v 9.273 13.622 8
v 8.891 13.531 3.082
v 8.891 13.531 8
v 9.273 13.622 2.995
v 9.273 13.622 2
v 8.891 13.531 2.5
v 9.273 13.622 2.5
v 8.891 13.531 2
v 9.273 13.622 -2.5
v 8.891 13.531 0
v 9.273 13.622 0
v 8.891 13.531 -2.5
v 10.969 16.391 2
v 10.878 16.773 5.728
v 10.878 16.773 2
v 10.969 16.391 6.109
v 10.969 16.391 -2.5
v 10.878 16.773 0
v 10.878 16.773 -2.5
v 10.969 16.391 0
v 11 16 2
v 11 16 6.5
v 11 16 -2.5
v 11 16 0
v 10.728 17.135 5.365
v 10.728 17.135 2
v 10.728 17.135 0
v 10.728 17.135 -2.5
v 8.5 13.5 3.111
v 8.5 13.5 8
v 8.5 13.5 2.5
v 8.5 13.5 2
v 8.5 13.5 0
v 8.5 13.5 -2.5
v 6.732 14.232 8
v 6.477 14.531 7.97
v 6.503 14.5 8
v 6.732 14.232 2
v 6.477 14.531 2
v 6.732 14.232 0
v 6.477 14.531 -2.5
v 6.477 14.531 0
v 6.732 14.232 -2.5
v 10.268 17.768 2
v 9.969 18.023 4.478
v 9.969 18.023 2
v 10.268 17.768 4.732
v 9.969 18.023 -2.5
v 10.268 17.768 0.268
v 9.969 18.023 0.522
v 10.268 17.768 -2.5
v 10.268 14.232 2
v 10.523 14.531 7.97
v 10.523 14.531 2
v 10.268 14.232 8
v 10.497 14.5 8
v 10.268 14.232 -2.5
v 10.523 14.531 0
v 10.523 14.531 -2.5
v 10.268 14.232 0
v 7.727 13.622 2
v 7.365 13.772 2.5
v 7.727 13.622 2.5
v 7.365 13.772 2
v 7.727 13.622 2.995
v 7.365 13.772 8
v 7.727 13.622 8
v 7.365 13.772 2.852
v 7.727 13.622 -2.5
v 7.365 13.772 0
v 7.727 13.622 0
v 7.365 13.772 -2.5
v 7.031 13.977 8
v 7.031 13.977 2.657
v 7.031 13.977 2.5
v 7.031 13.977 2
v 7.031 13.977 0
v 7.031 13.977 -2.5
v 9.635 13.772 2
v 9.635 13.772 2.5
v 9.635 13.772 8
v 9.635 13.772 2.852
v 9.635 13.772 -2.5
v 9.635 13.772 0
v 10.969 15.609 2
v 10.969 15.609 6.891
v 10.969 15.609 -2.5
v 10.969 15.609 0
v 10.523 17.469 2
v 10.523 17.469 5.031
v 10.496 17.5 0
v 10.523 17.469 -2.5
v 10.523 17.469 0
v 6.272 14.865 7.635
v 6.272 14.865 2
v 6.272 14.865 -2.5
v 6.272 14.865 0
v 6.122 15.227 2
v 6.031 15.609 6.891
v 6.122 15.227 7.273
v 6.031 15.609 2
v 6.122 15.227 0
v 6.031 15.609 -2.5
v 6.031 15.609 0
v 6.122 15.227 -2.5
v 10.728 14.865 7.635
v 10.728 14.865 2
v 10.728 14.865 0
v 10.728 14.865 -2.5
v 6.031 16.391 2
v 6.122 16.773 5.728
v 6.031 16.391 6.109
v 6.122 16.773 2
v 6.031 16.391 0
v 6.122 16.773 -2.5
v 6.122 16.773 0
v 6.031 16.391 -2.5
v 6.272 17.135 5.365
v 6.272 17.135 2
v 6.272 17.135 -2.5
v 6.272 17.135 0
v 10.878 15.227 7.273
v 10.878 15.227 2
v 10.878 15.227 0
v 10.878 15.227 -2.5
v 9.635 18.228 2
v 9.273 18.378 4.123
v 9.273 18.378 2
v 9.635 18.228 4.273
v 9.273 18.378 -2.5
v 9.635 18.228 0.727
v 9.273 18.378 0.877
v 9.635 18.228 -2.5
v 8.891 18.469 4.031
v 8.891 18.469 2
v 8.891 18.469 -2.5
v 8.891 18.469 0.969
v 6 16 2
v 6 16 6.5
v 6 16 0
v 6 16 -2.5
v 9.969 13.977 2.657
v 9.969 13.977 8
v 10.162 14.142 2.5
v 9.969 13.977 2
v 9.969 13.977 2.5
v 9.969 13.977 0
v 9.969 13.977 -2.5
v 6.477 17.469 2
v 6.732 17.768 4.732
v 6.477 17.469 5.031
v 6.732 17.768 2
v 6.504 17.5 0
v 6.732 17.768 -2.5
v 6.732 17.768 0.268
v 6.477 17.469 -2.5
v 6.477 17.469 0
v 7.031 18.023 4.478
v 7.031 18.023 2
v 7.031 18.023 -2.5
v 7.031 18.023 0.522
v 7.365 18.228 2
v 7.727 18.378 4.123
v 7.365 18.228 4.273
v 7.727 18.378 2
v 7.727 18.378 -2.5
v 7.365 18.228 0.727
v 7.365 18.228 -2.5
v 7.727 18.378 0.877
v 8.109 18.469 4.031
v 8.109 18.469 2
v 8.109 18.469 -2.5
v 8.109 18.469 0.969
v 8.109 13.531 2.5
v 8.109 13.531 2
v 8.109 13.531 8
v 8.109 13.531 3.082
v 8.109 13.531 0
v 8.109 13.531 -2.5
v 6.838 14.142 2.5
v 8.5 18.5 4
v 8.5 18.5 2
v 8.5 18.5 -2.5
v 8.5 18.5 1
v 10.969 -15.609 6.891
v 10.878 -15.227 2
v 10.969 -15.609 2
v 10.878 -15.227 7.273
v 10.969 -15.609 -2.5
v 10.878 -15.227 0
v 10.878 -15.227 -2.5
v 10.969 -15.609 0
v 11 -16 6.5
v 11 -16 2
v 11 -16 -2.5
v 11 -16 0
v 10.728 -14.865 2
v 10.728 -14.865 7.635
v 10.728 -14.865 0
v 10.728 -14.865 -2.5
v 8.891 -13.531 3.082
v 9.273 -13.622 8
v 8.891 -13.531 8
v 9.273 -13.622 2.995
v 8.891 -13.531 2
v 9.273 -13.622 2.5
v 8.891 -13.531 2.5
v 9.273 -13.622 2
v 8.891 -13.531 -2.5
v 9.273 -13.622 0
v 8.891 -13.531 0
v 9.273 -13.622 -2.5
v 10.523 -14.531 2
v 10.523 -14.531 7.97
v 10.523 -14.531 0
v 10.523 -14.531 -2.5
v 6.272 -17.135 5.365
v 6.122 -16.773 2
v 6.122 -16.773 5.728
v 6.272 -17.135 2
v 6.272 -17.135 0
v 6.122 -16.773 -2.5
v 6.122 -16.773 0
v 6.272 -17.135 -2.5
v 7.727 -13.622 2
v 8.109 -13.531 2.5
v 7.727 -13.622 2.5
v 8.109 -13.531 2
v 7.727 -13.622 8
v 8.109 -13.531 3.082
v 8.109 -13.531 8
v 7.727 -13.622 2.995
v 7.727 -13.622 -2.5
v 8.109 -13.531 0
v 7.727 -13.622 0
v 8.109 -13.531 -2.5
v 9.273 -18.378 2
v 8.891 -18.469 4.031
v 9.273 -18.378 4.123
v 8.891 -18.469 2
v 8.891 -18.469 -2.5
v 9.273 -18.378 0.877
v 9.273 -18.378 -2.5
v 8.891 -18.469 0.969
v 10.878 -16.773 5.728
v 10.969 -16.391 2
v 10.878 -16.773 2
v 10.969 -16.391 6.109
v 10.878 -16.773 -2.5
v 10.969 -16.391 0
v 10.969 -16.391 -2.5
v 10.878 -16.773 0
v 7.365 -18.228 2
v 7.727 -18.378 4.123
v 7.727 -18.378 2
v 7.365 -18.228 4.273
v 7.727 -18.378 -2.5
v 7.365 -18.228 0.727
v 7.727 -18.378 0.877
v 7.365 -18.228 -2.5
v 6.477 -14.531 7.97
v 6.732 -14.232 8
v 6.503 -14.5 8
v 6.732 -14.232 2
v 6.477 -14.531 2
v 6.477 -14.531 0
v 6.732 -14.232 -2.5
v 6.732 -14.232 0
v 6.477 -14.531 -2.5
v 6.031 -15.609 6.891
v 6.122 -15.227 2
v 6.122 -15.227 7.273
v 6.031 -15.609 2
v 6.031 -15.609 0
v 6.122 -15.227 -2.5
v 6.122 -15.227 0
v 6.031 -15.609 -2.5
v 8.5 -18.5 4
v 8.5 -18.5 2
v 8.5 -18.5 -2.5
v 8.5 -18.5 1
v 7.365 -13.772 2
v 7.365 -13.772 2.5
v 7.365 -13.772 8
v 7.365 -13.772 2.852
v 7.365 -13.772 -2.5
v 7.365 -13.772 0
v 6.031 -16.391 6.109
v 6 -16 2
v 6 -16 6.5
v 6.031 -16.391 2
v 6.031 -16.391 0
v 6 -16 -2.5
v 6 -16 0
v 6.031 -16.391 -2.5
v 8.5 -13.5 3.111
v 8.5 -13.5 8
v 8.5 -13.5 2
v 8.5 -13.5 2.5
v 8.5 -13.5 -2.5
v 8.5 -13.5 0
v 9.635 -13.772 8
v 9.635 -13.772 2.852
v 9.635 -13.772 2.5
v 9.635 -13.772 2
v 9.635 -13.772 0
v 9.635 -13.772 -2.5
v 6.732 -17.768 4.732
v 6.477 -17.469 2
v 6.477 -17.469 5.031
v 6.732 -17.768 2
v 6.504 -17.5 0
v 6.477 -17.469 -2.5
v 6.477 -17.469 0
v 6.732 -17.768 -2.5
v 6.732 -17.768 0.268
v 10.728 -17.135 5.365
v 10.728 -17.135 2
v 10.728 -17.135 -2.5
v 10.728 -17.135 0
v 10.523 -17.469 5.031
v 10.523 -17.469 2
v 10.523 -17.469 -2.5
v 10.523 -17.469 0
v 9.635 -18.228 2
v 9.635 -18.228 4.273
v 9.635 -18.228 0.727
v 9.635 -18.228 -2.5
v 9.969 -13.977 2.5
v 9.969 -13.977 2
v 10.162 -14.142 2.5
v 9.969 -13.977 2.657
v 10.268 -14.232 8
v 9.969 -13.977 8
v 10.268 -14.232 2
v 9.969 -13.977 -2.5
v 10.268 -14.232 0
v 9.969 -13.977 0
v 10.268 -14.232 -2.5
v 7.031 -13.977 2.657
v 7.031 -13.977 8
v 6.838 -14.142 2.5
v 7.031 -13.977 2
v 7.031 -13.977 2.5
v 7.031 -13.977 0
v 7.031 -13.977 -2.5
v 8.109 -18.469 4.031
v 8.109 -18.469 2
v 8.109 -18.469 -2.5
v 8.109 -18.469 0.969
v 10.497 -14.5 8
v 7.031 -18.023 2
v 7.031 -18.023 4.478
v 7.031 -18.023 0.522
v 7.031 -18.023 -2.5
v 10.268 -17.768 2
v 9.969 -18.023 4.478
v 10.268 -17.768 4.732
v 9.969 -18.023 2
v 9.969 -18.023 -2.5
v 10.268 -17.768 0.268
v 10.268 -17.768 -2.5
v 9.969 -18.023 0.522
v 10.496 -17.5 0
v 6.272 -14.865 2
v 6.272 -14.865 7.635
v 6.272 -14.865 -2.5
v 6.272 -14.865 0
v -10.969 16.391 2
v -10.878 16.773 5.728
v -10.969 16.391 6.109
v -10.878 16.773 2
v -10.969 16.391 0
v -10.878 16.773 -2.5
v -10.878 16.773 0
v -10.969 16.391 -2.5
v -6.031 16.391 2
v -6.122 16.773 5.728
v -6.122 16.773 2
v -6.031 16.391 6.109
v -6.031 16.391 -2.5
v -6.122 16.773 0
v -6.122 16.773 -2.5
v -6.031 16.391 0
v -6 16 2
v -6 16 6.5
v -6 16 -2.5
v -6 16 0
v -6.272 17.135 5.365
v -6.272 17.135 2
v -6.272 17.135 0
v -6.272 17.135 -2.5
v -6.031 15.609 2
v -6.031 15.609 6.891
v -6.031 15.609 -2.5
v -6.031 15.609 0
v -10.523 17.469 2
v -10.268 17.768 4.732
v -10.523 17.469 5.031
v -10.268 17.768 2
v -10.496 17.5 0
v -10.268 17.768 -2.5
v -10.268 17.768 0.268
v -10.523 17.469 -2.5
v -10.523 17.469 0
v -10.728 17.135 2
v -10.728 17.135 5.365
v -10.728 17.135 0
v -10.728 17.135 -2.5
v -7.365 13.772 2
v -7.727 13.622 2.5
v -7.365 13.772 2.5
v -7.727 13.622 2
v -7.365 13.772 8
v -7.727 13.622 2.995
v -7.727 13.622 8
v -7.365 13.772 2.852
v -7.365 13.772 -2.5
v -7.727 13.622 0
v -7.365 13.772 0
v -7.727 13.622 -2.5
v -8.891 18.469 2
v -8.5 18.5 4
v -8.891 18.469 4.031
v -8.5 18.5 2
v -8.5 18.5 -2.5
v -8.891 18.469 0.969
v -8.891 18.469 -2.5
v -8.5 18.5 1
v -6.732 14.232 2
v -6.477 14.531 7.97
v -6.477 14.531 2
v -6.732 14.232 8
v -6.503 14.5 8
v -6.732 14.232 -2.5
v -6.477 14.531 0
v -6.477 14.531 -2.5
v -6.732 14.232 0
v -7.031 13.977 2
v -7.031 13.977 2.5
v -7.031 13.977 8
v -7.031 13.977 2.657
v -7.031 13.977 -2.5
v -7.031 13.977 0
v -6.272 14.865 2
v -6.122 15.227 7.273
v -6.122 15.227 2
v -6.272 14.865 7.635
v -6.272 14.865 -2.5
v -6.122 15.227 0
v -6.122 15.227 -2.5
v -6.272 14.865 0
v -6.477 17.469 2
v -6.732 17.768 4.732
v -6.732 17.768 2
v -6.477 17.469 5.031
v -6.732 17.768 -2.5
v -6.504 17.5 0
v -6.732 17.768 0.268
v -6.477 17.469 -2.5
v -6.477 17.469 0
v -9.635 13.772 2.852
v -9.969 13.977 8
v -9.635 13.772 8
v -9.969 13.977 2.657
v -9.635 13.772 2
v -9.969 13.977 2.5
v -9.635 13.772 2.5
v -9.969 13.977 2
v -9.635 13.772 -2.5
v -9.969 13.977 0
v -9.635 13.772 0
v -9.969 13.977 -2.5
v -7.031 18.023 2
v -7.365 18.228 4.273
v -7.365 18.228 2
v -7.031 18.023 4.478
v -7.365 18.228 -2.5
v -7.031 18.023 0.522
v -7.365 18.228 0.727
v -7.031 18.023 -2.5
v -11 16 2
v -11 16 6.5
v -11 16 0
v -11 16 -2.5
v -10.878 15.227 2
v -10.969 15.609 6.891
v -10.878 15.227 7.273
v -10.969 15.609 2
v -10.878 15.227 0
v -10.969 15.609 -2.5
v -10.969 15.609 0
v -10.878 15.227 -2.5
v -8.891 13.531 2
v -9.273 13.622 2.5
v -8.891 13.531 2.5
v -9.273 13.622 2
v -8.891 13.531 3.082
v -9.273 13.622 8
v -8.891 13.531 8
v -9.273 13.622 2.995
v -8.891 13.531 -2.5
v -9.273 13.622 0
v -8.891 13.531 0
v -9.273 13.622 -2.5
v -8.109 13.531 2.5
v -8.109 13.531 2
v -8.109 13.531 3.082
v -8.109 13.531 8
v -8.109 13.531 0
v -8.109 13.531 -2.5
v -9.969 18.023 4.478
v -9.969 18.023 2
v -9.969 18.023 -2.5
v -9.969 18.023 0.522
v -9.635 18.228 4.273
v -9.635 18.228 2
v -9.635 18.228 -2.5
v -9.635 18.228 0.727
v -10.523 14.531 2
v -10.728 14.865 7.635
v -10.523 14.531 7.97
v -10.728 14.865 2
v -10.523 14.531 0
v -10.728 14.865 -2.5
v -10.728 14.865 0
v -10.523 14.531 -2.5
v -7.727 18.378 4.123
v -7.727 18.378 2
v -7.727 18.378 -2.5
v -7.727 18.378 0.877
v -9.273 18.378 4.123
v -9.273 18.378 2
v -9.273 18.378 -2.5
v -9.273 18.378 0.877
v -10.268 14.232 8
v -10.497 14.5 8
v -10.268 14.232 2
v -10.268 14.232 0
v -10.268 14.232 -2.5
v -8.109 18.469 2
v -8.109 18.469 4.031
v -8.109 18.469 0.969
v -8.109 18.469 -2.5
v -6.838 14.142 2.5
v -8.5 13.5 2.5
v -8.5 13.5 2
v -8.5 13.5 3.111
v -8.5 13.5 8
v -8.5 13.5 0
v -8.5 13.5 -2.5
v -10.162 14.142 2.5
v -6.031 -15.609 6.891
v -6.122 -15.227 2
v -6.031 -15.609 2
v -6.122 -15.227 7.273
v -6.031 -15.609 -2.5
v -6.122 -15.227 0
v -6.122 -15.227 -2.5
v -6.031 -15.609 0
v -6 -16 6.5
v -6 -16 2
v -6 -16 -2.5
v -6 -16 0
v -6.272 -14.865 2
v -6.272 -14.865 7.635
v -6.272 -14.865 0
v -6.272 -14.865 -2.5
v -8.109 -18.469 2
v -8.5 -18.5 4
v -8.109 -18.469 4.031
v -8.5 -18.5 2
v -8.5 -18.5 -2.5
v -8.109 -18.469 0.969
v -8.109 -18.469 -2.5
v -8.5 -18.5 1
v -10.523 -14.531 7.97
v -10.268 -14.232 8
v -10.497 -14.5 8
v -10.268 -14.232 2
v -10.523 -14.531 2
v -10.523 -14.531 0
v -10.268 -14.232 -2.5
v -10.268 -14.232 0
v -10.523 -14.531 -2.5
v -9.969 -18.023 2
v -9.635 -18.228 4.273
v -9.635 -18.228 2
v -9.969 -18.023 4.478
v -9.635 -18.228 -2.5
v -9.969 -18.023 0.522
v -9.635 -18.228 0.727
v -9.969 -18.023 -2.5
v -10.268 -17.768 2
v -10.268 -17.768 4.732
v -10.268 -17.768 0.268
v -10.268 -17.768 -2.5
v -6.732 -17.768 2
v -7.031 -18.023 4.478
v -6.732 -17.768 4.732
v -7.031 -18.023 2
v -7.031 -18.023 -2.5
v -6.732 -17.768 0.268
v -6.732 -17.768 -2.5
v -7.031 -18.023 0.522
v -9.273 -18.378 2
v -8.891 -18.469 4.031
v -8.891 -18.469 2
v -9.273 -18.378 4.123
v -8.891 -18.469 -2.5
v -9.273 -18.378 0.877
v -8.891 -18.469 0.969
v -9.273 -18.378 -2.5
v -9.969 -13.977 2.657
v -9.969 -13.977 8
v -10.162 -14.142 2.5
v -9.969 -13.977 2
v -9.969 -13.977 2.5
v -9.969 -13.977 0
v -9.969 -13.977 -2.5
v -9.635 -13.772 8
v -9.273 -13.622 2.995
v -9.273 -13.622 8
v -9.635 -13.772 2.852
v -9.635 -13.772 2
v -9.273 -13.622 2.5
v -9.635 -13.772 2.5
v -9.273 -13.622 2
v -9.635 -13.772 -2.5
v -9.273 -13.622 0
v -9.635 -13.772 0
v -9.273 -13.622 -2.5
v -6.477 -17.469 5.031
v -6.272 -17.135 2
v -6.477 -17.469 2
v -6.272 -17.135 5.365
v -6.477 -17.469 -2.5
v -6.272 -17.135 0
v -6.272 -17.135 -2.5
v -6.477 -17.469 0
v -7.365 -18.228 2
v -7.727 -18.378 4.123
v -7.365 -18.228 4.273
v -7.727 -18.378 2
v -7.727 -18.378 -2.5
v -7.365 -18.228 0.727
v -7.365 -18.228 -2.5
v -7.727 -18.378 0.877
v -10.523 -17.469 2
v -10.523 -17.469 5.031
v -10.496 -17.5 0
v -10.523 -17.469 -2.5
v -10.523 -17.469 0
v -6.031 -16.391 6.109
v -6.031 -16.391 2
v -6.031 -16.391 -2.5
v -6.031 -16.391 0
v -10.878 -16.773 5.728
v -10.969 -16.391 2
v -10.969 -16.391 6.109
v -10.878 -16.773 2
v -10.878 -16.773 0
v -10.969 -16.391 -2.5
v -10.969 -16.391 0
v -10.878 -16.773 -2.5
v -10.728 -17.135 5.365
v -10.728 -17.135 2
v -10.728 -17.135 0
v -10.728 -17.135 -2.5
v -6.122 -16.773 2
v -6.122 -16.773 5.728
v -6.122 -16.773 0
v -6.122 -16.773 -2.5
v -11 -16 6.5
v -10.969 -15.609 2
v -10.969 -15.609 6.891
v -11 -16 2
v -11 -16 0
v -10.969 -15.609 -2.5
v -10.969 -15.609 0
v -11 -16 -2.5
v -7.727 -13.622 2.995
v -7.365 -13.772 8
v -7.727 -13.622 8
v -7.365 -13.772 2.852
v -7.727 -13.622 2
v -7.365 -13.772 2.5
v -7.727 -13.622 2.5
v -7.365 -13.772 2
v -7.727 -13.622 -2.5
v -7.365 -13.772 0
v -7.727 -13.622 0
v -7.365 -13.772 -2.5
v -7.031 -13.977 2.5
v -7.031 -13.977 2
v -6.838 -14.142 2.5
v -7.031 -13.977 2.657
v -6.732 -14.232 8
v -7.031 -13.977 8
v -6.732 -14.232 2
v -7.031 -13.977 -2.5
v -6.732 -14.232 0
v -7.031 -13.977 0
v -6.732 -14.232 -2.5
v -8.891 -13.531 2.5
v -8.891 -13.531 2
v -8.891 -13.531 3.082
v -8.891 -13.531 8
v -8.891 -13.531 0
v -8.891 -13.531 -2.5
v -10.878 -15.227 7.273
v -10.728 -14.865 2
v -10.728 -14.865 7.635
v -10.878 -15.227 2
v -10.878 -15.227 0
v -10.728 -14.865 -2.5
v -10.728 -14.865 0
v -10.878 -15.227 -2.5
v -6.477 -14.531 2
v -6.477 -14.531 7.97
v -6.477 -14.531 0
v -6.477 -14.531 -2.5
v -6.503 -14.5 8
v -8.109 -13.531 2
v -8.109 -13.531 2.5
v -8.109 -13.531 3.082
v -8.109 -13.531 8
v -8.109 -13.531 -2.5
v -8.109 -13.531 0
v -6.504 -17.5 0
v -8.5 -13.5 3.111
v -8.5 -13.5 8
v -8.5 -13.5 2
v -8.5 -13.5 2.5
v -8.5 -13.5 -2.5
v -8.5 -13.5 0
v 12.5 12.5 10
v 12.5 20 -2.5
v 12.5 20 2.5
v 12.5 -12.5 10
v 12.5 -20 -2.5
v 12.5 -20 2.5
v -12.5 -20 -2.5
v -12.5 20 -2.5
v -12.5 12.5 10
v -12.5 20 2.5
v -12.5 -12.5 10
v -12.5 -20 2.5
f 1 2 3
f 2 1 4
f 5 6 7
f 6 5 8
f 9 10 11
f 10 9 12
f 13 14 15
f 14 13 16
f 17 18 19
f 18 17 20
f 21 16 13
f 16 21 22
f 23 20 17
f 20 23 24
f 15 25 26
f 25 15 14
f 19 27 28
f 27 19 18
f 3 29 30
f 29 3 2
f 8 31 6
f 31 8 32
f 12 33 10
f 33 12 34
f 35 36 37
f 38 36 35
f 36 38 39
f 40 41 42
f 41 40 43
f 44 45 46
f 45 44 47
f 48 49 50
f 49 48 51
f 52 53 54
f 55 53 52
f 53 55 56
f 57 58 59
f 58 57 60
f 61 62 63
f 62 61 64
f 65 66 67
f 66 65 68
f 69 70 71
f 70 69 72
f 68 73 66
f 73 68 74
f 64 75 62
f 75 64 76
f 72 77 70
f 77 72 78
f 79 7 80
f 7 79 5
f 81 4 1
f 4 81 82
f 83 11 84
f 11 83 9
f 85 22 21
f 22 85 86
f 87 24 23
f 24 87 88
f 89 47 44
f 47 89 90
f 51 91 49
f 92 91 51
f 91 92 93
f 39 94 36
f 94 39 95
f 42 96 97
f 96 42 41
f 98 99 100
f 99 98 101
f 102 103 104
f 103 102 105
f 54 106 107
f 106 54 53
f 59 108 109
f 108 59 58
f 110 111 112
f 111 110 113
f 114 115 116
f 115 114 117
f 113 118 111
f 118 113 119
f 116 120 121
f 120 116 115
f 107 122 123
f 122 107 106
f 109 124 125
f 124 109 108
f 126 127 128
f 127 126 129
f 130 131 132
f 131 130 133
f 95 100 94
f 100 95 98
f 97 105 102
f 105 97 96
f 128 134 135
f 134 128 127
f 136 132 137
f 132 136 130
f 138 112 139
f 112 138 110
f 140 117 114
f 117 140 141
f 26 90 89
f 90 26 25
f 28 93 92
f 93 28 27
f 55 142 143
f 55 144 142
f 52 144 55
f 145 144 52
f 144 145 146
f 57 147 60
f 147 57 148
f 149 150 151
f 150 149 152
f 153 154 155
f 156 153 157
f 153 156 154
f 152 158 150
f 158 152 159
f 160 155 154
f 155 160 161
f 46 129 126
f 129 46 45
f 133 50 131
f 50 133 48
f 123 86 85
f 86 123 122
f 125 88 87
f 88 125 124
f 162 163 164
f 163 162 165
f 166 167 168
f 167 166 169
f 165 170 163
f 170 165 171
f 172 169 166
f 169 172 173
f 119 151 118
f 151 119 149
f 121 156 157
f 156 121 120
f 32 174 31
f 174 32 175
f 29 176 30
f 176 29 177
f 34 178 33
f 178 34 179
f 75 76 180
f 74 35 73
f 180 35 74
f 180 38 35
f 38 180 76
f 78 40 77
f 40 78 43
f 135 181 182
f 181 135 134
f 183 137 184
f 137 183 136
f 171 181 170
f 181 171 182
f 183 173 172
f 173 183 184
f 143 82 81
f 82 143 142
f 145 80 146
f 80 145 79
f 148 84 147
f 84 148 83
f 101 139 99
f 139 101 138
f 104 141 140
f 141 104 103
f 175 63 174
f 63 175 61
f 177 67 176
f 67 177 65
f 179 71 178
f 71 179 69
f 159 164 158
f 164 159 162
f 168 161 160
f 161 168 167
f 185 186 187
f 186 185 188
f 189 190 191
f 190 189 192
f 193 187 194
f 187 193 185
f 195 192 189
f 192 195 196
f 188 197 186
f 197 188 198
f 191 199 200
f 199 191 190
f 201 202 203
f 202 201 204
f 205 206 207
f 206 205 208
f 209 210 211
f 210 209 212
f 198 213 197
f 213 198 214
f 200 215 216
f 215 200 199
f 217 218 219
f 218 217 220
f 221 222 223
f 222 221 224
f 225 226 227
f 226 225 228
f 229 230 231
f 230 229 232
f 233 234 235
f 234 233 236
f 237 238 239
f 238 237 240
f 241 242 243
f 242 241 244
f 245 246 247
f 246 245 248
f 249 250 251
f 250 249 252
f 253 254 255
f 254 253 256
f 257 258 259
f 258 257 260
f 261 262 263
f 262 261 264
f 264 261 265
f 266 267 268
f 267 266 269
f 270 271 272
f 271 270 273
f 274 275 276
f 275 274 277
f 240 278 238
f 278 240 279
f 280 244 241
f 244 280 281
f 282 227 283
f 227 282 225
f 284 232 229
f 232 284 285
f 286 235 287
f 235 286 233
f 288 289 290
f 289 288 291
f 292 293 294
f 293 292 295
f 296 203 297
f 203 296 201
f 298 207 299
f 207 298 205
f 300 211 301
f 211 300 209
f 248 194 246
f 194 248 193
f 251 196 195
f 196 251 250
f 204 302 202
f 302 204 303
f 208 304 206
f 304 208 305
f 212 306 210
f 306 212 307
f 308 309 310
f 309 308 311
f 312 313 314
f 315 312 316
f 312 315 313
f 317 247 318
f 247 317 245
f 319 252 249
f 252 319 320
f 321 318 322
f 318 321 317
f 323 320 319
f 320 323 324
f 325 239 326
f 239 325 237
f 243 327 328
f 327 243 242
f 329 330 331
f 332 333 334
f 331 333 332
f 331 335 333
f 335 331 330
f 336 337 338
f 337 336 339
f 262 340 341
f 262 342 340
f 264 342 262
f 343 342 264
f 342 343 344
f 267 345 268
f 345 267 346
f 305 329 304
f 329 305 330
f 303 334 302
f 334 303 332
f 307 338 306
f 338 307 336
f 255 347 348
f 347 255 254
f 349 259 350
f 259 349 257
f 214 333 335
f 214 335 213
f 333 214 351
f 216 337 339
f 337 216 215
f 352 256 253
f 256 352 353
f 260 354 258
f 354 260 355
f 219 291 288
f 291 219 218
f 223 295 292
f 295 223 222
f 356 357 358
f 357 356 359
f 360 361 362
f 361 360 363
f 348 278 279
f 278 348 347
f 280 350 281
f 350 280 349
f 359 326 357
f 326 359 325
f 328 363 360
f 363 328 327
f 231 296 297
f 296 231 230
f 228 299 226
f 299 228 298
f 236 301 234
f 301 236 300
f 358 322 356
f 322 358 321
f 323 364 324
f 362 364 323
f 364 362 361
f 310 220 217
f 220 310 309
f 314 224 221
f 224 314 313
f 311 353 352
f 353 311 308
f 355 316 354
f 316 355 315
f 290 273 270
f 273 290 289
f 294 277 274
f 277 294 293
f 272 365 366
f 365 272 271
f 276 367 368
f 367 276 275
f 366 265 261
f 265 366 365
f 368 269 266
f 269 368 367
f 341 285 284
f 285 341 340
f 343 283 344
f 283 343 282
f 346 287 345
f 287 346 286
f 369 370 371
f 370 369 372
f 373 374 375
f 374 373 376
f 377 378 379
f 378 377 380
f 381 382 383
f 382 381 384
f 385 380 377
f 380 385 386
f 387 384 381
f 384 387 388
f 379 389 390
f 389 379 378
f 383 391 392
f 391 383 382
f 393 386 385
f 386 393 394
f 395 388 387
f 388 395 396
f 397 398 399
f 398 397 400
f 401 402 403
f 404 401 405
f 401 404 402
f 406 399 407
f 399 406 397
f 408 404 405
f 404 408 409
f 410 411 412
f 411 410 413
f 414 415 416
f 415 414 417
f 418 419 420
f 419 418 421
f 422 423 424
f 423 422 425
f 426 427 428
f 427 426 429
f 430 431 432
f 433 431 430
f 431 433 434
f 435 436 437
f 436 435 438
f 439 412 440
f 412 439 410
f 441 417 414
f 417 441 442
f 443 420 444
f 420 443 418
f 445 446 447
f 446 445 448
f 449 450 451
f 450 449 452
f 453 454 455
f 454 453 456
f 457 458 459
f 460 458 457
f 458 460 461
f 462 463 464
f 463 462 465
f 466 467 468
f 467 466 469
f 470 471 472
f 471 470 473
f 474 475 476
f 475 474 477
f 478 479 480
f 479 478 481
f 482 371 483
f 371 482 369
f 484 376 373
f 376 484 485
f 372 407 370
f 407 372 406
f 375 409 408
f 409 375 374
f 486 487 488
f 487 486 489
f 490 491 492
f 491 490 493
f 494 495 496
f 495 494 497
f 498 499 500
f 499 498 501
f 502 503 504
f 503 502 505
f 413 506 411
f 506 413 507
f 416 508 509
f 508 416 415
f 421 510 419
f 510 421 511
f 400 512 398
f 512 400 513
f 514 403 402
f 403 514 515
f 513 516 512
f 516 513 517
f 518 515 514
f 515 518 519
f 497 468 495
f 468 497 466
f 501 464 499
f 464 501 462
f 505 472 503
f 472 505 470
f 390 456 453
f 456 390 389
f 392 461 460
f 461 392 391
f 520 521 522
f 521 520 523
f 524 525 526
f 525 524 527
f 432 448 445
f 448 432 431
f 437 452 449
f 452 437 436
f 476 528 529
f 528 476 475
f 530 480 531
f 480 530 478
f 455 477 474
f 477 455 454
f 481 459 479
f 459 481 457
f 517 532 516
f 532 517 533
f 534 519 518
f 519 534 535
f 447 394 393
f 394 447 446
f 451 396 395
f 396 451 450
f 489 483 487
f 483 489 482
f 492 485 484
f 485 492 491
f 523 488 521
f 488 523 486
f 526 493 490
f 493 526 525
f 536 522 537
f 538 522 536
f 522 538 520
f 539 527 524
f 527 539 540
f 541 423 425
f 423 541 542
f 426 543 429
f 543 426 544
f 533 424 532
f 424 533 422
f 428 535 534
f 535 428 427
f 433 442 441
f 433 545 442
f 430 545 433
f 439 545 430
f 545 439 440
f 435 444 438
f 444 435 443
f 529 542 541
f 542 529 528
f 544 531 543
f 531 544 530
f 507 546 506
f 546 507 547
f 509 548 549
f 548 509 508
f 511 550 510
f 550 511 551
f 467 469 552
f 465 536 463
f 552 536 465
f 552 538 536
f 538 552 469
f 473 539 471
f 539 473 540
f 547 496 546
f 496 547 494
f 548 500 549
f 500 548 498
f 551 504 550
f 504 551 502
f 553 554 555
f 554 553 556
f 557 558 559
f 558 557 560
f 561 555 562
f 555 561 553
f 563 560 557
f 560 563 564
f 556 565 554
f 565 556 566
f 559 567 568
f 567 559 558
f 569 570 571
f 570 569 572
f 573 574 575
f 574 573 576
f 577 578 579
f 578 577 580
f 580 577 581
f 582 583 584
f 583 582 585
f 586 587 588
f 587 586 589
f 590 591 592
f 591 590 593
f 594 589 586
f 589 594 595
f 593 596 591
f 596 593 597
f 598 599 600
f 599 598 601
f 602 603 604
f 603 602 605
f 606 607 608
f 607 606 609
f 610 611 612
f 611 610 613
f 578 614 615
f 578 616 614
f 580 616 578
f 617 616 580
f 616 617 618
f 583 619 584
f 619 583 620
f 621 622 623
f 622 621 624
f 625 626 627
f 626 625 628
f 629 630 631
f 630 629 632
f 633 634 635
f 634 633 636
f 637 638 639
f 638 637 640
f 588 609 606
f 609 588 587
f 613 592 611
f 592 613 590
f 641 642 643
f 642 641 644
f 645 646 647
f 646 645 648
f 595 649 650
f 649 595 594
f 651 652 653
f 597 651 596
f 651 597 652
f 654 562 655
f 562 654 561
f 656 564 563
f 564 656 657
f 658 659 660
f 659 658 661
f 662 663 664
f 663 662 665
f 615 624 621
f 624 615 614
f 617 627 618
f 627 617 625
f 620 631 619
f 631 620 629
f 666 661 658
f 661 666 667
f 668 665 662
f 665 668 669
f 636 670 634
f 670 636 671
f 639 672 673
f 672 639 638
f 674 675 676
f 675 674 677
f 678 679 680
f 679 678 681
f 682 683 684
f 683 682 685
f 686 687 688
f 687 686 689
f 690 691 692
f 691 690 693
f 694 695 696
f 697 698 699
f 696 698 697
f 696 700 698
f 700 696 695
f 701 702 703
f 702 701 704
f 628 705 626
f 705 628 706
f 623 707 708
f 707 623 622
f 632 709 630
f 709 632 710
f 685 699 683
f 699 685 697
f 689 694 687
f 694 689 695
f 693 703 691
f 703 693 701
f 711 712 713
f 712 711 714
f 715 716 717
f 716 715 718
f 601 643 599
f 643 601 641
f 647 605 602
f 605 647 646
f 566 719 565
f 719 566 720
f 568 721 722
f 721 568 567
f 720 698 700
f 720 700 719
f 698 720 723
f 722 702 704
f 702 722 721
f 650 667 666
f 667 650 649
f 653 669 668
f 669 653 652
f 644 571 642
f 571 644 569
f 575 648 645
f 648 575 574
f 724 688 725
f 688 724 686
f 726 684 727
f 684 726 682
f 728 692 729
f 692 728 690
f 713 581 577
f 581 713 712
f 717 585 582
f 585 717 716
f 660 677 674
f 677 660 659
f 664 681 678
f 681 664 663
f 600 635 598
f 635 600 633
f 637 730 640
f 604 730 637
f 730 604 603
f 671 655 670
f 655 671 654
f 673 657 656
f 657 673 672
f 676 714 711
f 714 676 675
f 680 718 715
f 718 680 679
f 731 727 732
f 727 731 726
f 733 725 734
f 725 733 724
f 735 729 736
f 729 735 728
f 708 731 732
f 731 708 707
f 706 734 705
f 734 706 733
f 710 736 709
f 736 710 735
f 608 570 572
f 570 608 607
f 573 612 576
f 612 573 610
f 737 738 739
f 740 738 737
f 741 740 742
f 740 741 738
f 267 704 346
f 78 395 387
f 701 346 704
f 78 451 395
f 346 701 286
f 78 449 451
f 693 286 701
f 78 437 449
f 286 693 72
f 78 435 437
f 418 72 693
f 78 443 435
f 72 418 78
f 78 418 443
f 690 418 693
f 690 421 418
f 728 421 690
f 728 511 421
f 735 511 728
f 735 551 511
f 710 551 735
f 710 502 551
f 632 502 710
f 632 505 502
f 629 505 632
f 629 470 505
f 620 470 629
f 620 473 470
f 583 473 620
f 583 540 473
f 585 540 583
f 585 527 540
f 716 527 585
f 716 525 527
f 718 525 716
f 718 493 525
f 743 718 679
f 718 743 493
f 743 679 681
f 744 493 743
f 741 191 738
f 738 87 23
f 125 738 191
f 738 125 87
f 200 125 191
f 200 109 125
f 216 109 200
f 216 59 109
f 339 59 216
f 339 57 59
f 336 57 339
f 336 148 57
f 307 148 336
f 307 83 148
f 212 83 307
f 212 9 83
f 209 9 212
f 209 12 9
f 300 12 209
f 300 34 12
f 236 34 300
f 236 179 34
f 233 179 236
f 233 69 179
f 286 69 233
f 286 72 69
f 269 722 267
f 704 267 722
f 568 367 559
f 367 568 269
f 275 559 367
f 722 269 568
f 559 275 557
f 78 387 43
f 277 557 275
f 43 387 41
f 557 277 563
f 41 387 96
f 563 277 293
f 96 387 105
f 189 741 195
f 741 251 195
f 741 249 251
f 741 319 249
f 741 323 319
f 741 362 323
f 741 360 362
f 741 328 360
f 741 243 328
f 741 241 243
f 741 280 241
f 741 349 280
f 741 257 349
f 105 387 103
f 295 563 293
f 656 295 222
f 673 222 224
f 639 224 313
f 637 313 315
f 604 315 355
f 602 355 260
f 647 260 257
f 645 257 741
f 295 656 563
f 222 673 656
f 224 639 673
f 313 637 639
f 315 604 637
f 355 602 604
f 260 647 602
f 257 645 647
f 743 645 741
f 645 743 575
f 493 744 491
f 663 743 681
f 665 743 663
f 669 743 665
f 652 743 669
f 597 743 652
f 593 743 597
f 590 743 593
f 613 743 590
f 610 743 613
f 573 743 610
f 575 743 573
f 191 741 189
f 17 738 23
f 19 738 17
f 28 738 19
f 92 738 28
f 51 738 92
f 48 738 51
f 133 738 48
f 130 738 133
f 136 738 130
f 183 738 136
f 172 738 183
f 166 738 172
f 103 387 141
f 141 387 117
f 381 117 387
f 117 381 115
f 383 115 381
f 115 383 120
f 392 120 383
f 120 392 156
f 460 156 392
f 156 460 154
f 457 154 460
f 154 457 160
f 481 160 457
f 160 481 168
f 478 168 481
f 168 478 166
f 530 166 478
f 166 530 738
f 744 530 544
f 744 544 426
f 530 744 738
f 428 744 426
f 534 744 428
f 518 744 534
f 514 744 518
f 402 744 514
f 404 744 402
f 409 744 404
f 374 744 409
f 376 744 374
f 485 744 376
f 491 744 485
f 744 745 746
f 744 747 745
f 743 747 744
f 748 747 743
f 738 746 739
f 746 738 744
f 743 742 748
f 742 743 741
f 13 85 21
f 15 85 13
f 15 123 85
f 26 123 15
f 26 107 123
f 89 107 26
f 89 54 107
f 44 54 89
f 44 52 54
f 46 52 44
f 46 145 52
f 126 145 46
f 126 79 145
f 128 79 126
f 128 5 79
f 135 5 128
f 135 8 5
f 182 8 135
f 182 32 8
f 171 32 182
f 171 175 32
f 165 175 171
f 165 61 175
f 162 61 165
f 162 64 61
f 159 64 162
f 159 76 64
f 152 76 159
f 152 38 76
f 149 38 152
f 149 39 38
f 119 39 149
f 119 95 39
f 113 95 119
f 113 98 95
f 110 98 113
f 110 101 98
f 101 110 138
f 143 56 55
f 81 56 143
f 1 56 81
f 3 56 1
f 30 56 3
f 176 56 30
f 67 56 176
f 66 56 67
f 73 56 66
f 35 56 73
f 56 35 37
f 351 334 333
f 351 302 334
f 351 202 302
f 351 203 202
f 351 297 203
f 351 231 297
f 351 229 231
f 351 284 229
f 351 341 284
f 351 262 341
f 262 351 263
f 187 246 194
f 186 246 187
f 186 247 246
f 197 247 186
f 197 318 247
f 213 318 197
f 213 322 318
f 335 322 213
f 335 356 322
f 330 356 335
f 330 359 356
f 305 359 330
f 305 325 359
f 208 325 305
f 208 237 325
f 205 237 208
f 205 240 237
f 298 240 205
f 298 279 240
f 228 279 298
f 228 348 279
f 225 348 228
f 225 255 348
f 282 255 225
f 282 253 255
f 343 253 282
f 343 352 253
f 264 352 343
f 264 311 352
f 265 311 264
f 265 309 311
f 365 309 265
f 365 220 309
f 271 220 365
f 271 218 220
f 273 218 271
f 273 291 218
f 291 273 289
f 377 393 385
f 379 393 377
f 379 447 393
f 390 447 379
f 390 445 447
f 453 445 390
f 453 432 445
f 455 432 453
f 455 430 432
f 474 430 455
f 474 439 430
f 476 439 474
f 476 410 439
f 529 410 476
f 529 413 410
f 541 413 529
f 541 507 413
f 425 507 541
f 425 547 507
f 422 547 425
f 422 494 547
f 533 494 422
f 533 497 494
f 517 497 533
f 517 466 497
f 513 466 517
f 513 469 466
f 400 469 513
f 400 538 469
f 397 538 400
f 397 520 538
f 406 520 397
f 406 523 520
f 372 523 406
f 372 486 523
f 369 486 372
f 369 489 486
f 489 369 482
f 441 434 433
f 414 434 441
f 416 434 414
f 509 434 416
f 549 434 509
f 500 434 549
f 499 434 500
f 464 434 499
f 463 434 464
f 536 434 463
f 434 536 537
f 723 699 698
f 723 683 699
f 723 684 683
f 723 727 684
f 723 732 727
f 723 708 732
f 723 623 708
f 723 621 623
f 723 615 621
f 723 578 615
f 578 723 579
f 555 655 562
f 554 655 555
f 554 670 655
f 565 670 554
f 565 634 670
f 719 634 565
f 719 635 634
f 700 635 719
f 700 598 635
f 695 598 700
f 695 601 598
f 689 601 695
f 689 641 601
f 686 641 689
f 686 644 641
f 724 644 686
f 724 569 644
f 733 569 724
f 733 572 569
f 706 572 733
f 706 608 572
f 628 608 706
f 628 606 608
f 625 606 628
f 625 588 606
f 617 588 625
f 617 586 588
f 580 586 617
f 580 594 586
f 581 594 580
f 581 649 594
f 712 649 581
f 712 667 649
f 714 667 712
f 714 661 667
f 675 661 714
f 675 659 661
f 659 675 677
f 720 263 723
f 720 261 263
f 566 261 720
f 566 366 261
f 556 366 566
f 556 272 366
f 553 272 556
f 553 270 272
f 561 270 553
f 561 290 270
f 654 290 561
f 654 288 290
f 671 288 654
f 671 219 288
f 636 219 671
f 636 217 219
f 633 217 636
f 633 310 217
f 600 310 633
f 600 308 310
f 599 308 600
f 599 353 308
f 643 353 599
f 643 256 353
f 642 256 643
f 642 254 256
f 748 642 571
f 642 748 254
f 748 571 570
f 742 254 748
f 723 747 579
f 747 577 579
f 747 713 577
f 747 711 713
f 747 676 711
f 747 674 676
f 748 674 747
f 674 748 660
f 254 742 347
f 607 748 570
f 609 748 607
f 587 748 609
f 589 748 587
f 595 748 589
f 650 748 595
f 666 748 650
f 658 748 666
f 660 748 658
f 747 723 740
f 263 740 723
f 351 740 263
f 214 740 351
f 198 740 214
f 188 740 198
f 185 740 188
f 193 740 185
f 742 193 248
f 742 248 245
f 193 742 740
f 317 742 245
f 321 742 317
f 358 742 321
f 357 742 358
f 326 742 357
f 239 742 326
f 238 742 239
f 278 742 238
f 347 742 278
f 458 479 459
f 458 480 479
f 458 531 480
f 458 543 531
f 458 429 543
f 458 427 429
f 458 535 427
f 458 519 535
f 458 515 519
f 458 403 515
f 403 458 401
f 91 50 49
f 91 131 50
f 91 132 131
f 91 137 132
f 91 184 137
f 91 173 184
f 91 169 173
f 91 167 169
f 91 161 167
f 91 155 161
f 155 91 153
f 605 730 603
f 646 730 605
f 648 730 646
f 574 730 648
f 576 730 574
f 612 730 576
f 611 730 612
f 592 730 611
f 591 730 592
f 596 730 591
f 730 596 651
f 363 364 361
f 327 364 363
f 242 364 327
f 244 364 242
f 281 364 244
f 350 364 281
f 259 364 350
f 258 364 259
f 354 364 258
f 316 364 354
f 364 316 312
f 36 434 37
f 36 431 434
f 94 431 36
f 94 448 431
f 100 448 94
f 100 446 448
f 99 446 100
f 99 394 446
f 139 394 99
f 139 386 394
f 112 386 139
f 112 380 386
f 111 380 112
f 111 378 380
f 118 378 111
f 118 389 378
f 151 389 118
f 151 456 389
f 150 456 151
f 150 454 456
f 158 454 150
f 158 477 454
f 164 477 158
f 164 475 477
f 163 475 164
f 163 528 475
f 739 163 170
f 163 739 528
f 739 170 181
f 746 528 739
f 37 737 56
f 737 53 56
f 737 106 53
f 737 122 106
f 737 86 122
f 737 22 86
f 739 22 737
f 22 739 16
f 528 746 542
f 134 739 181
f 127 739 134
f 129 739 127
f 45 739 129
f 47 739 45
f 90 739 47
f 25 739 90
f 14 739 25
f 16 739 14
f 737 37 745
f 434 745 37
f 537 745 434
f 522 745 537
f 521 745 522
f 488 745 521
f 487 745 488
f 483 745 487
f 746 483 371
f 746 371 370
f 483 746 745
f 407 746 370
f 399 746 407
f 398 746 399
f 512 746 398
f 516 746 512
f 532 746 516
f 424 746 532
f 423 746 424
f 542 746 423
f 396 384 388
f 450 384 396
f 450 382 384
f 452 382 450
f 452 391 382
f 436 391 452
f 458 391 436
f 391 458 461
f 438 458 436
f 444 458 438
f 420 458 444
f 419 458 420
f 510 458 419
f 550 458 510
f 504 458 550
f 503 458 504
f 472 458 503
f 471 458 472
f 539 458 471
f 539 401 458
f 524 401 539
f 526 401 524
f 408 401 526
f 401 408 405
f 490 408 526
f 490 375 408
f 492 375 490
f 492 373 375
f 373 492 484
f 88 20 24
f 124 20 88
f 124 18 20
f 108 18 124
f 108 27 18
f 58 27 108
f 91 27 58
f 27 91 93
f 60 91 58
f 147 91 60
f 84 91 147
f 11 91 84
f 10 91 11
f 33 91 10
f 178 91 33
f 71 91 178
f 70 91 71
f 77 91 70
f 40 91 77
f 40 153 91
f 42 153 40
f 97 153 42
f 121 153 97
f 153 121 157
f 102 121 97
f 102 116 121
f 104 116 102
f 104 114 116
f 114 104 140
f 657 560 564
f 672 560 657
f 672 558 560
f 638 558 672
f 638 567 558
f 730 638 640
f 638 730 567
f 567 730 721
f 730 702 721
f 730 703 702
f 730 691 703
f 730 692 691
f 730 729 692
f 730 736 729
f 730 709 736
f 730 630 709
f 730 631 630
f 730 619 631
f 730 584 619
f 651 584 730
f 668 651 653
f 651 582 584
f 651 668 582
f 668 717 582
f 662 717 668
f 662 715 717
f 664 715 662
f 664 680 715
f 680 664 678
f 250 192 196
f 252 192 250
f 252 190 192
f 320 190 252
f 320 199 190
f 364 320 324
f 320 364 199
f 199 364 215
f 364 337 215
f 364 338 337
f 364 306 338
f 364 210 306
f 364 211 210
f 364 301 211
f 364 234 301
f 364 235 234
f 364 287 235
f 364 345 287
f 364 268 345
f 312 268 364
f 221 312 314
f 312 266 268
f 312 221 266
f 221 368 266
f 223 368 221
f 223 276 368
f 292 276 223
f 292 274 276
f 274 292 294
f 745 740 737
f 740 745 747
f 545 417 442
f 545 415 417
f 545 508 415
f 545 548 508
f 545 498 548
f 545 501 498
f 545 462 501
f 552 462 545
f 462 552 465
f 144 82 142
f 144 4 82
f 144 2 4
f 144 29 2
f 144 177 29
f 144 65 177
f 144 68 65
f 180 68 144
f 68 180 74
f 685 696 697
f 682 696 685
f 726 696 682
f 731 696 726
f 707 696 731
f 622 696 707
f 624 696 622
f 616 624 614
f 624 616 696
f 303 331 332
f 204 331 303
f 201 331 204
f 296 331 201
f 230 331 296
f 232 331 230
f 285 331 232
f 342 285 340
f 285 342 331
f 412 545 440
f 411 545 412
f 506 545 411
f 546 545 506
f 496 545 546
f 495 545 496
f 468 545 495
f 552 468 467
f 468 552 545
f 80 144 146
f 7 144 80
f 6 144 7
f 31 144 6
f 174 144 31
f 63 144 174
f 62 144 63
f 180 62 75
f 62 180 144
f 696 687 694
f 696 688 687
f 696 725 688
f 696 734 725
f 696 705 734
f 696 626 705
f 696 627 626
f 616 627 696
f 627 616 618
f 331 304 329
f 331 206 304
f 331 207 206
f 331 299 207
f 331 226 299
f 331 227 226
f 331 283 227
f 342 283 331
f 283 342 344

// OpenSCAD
// file: microGearMotorMount.scad
//===============================
//
//  No-tools micro motor mounts
//
//  Designed by Andrew Moore, May 2016
//      http://www.thingiverse.com/TacPar
//
//      For questions, suggestions, or whatever, 
//      please PM me through thingiverse.
//
//      This work is licensed under a Creative Commons 
//      Attribution-ShareAlike 4.0 International License.
//      http://creativecommons.org/licenses/by-sa/4.0/
//
//  This can be used with a variety of 12mm micro gear motors
//  Length dimensions may need to change to accomodate 
//  different gear ratios (particularly the Pololu 
//  1000:1 motors)
//
//  This design allows for a little slop in motor 
//  position.  You can always tighten that up with 
//  some shim stock after you insert the motor.
//
//  The mounting holes are arbitrarily set based on the plate dimensions
//  This could be improved.
//
//  If you use an encoder, you may have to solder it to the back of the 
//  motor after inserting the motor into the holder.
//===============================



//this is motor length without the gearbox
motor_length = 15;
//dimension for rounded sides on micro motor
motor_width = 12; 	
//flat sides on micro motor
motor_height = 10;
//length of the gear box not including the output shaft
gearbox_length = 10;

//wall thickness for the motor holder before tolerance losses
housing_thickness = 3;

//this defines how oversized the hole is for the motor
//this will reduce the effective housing thickness above
tolerance = 0.25;

plate_width = 40;

plate_length = motor_length+gearbox_length;

module MicroGearMotorMount(
  plate_thickness = 3
)
{
	//backplate()
	difference()
	{
		positives();
		negatives();
	}
	//add ons in areas that were erased...
	
	//back plate
	translate([plate_length/2-motor_length/2,0,-(motor_height/2+plate_thickness/2)]) BackPlate(plate_thickness);

	module positives()
	{
		//motor holding ring
		rotate([0,90,0]) 
            translate([0,0,0]) 
            cylinder(r=motor_width/2+housing_thickness, h=motor_length, center=true, $fn=40);

		translate([0,0,-motor_height/2+plate_thickness]) 
            cube([motor_length,motor_width+2*housing_thickness,motor_height-plate_thickness], center=true);

	}

	module negatives()
	{
		//cut off cylinder below the mounting plate
		translate([0,0,-(motor_height/2+plate_thickness-0.01)]) 
            cube([100,100,2*plate_thickness], center=true);

		//keyed shaft
		rotate([0,90,0]) 
        translate([0,0,-motor_length/2-0.1]) keyshaft(); 
        //translate([0,0,-motor_height/4]) cube([motor_length+.1,motor_width+1,motor_height/2], center=true);
		
	}
    module keyshaft()
    {
        difference()
		{
			positives();
            negatives();
            
			
		}
        module positives()
        {
            cylinder(r=motor_width/2+tolerance, h=motor_length+1, $fn=50);
        }
        
        module negatives()
        {
            translate([-motor_height-tolerance,0,motor_length/2+tolerance]) cube([motor_height,motor_width,motor_length+2],center=true);
            translate([motor_height+tolerance,0,motor_length/2+tolerance]) cube([motor_height,motor_width,motor_length+2],center=true);
        }
    }
  }


module BackPlate(plate_thickness=3,tab=true,screw_radius=1.75)
	{
      tongue_thickness=2;
      tab_height = tongue_thickness+2;
      tab_width = 5;
      tab_thickness = 1.5;

      difference()
      {
        positives();
        negatives();
      }
        
      module positives()
      {
          cube([plate_length,plate_width,plate_thickness],center=true);
      }
      module negatives()
      {
          mount_holes();
        if (tab) {tab_slots();}
      }
        
      module mount_holes()
      {
        rotate([0,0,0]) 
                  translate([plate_length/2-4,plate_width/2-4,0]) 
                  cylinder(r=screw_radius, h=plate_thickness+1, $fn=40, center=true);
        rotate([0,0,0])
                  translate([plate_length/2-4,-(plate_width/2-4),0]) 
                  cylinder(r=screw_radius, h=plate_thickness+1, $fn=40, center=true);
        rotate([0,0,0])
                  translate([-(plate_length/2-4),plate_width/2-4,0]) 
                  cylinder(r=screw_radius, h=plate_thickness+1, $fn=40, center=true);
        rotate([0,0,0])
                  translate([-(plate_length/2-4),-(plate_width/2-4),0]) 
                  cylinder(r=screw_radius, h=plate_thickness+1, $fn=40, center=true);
        
      }
      
      module tab_slots()
      {
        translate([0.4*plate_length,tab_width/2, 0]) cube([plate_length,1,plate_thickness+1], center=true);
        translate([0.4*plate_length,-tab_width/2, 0]) cube([plate_length,1,plate_thickness+1], center=true);
        
        // If the tongue needs to be thinner
        translate([0.4*plate_length,0, -tongue_thickness]) cube([plate_length,tab_width,plate_thickness], center=true);
      }
	

	   //gearbox tab ... stops motor from sliding forward
      if (tab)
      {
        translate([plate_length/2+tab_thickness/2,0,plate_thickness/2]) cube([tab_thickness,tab_width-1,tab_height], center=true);
        
        //Print a very thin support that will break, so tab can be printed in upright rotation
        support_thickness=0.1;
        translate([plate_length/2,(tab_width-1)/2,plate_thickness/2])rotate([0,0,180])prism(support_thickness,tab_height-tongue_thickness,tab_height-tongue_thickness);
        translate([plate_length/2,-(tab_width-1)/2+support_thickness,plate_thickness/2])rotate([0,0,180])prism(support_thickness,tab_height-tongue_thickness,tab_height-tongue_thickness);
      }
}

//Draw a prism based on a 
//right angled triangle
//l - length of prism
//w - width of triangle
//h - height of triangle
//From https://github.com/orionrobots/openscad_parts_library/blob/master/prism.scad
module prism(l, w, h) {
       polyhedron(points=[
               [0,0,h],           // 0    front top corner
               [0,0,0],[w,0,0],   // 1, 2 front left & right bottom corners
               [0,l,h],           // 3    back top corner
               [0,l,0],[w,l,0]    // 4, 5 back left & right bottom corners
       ], faces=[ // points for all faces must be ordered clockwise when looking in
               [0,2,1],    // top face
               [3,4,5],    // base face
               [0,1,4,3],  // h face
               [1,2,5,4],  // w face
               [0,3,5,2],  // hypotenuse face
       ]);
}

MicroGearMotorMount();
// main file
use <microGearMotorMount.scad>


//this is motor length without the gearbox
motor_length = 15;
//dimension for rounded sides on micro motor
motor_width = 12; 	
//flat sides on micro motor
motor_height = 10;
//length of the gear box not including the output shaft
gearbox_length = 10;

//wall thickness for the motor holder before tolerance losses
housing_thickness = 3;

//this defines how oversized the hole is for the motor
//this will reduce the effective housing thickness above
tolerance = 0.25;

plate_width = 40;

plate_length = motor_length+gearbox_length;

plate_thickness=5;
screw_radius=2.5;
corner_radius=20;

sqr2=1.4142;

rotate([0,0,0])BackPlate(plate_thickness=plate_thickness, tab=false, screw_radius=screw_radius);

cube_side = plate_width/sqr2;
difference() 
{
translate([0,0,plate_thickness/2])rotate([45,0,0])cube([plate_length,cube_side,cube_side],center=true);
translate([0,0,-cube_side/2]) cube([plate_length,plate_width,cube_side],center=true);
translate([0,0,plate_thickness])rotate([0,0,0])mount_holes();
translate([0,0,20])cube([plate_length, plate_width,20],center=true);
}
//difference() {
Corner(plate_length,plate_width,corner_radius,plate_thickness);
//translate([0,0,plate_thickness])rotate([0,0,0])mount_holes();
//}
module Corner(length,width,corner_radius, plate_thickness)
{
translate([0,0,-(corner_radius*sqr2/2)+plate_thickness/2])
rotate([0,90,0])
{
difference () {
  cylinder(r=corner_radius,h=length, center=true, $fn=128);
  translate([corner_radius-(corner_radius*sqr2/2),0,0])cube([2*corner_radius,2*corner_radius,length],center=true);
}
}
}

      module mount_holes()
      {
        rotate([0,0,0]) 
                  translate([plate_length/2-4,plate_width/2-4,0]) 
                  cylinder(r=screw_radius, h=plate_thickness+1, $fn=40, center=true);
        rotate([0,0,0])
                  translate([plate_length/2-4,-(plate_width/2-4),0]) 
                  cylinder(r=screw_radius, h=plate_thickness+1, $fn=40, center=true);
        rotate([0,0,0])
                  translate([-(plate_length/2-4),plate_width/2-4,0]) 
                  cylinder(r=screw_radius, h=plate_thickness+1, $fn=40, center=true);
        rotate([0,0,0])
                  translate([-(plate_length/2-4),-(plate_width/2-4),0]) 
                  cylinder(r=screw_radius, h=plate_thickness+1, $fn=40, center=true);
        
      }
